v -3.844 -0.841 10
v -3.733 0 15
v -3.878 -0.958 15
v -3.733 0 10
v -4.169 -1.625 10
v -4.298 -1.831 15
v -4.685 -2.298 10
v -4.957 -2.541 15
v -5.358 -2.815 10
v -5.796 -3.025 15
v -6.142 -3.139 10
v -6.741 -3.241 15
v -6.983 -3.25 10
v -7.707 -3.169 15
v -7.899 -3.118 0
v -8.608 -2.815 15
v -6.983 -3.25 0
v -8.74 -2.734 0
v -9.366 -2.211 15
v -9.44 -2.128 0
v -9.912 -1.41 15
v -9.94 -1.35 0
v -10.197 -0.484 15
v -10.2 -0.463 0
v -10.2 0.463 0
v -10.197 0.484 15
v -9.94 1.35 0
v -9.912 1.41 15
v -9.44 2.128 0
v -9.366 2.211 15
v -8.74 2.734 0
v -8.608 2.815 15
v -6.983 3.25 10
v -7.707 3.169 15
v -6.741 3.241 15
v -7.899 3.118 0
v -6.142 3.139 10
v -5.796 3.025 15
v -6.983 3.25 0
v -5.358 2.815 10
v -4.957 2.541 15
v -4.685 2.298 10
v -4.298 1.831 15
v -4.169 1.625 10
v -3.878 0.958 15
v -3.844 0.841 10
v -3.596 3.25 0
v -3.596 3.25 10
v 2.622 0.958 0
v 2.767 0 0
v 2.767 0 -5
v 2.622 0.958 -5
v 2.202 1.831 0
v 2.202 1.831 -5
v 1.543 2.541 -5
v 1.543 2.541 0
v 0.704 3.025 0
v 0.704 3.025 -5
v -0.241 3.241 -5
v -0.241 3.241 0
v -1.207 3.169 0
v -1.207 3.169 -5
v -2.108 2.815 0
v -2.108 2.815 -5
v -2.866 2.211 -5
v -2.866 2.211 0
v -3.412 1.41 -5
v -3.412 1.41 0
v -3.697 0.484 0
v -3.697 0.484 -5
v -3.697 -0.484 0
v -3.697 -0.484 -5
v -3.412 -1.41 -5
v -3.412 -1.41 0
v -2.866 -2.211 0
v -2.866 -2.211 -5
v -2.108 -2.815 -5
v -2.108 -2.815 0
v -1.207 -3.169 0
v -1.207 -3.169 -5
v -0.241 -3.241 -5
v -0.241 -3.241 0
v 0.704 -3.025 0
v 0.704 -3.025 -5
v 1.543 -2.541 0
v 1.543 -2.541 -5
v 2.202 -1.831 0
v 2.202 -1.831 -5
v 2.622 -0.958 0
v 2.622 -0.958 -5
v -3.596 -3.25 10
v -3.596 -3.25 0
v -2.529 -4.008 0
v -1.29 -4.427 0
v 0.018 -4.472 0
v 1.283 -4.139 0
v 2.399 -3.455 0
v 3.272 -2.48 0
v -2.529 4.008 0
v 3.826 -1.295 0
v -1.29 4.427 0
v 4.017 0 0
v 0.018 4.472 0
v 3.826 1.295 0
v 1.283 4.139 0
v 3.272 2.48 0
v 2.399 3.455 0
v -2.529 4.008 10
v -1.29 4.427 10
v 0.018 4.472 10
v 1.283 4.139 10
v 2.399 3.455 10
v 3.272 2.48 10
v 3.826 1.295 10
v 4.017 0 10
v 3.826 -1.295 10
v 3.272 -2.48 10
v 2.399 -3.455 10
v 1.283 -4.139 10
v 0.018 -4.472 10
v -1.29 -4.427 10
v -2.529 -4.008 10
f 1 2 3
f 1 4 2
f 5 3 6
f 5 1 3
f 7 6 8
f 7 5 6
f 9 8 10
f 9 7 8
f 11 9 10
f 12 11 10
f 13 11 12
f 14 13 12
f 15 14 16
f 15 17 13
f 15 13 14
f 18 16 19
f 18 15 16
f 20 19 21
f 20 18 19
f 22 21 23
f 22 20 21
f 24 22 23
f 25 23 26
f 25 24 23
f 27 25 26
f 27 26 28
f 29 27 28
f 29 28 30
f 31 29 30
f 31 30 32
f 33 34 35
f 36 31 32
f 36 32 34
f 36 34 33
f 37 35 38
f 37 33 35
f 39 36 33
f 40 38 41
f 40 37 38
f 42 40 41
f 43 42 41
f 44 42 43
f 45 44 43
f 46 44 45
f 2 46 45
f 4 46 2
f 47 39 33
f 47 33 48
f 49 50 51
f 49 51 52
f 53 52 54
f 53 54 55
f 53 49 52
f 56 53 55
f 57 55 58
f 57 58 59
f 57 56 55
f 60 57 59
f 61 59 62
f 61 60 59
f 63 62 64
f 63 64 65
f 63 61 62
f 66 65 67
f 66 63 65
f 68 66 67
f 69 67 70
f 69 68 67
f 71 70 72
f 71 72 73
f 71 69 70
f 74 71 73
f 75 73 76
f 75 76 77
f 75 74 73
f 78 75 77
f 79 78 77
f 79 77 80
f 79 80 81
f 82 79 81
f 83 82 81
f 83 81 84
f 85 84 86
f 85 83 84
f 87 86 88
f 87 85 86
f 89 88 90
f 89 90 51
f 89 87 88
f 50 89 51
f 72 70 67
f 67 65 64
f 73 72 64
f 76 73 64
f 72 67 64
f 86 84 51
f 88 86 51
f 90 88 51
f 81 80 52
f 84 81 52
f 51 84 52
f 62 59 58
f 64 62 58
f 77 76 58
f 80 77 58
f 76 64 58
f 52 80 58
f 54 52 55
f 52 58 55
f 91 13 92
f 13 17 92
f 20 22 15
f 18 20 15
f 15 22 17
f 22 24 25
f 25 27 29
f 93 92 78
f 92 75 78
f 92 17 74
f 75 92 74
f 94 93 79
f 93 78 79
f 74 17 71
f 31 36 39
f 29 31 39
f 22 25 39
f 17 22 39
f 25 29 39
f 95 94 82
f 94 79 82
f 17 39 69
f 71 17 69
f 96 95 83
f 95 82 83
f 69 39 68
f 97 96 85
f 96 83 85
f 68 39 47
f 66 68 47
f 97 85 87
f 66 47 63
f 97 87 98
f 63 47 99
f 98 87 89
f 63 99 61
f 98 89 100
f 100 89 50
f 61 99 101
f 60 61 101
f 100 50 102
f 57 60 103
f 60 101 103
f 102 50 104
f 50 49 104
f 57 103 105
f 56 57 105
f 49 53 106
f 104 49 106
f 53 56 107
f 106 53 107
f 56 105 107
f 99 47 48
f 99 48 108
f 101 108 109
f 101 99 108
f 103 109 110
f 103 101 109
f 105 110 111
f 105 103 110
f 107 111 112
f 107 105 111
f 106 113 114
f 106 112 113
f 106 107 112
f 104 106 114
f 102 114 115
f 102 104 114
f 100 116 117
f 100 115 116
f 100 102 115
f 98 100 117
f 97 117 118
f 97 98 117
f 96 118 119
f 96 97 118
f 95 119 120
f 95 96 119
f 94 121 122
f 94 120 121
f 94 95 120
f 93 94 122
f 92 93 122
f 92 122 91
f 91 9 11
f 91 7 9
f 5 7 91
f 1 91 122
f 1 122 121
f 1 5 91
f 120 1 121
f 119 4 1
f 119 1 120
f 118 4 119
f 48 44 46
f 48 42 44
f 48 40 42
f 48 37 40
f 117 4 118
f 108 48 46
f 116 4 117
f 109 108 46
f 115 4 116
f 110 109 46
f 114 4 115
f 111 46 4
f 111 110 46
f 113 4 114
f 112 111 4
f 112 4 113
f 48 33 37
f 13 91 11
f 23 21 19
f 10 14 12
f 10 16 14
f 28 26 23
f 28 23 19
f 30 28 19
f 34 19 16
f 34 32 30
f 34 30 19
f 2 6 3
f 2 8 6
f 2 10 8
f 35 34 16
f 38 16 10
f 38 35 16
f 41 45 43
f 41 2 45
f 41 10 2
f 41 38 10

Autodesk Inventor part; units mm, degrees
ref_plane "YZ Plane" through (0, 0, 0) normal (1, 0, 0) x (0, 1, 0)
ref_plane "XZ Plane" through (0, 0, 0) normal (0, 1, 0) x (-1, 0, 0)
ref_plane "XY Plane" through (0, 0, 0) normal (0, 0, 1) x (1, 0, 0)
sketch "Sketch2" plane through (0, 0, 0) normal (0, 0, 1) x (1, 0, 0)
  line L0 (-6.9834, -3.25) -> (-3.5959, -3.25)
  arc A0 (-3.5959, -3.25) -> (-3.5959, 3.25) centre (-0.4834, 0) ccw
  circle A1 centre (-6.9834, 0) radius 3.25
  line L1 (7.6359, 0) -> (-9.8597, 0) construction
  line L2 (-6.9834, 3.25) -> (-3.5959, 3.25)
  circle A2 centre (-6.9834, 0) radius 3.25
  circle A3 centre (-0.4834, 0) radius 3.25
  point P0 (-7.0471, -3.1146)
  dimension "d6" = 6.5
  dimension "d7" = 9
  dimension "d8" = 6.5
extrude "Extrusion1" add sketch "Sketch2" along normal blind 10 contours A3 | A1 L2 A0 L0 | A1
extrude "Extrusion2" add sketch "Sketch2" against normal blind 5 contours A3
sketch "Sketch3" plane through (0, 0, 10) normal (0, 0, 1) x (1, 0, 0)
  arc A0 (-6.9834, 3.25) -> (-6.9834, -3.25) centre (-6.9834, 0) ccw projected
  line L0 (-3.5959, 3.25) -> (-6.9834, 3.25) projected
  arc A1 (-3.5959, -3.25) -> (-3.5959, 3.25) centre (-0.4834, 0) ccw
  line L1 (-6.9834, -3.25) -> (-3.5959, -3.25) projected
  circle A2 centre (-6.9834, 0) radius 3.25
  point P0 (-6.9834, -3.25)
  point P1 (-6.9834, 3.25)
  point P2 (-4.0488, -2.7456)
  point P3 (4.0134, -0.1685)
  dimension "d9" = 6.5
extrude "Extrusion3" add sketch "Sketch3" along normal blind 5 contours A2 A0
equation "\"d6\" = R"
equation "\"d7\" = R1"
equation "\"d8\" = R"
equation "\"d0\" = 2 * thickness"
equation "\"d2\" = thickness"
equation "\"d9\" = R"
equation "\"R\" = 6.5"
equation "\"thickness\" = 5"
equation "\"width\" = 6.5"
equation "\"R1\" = 9"
